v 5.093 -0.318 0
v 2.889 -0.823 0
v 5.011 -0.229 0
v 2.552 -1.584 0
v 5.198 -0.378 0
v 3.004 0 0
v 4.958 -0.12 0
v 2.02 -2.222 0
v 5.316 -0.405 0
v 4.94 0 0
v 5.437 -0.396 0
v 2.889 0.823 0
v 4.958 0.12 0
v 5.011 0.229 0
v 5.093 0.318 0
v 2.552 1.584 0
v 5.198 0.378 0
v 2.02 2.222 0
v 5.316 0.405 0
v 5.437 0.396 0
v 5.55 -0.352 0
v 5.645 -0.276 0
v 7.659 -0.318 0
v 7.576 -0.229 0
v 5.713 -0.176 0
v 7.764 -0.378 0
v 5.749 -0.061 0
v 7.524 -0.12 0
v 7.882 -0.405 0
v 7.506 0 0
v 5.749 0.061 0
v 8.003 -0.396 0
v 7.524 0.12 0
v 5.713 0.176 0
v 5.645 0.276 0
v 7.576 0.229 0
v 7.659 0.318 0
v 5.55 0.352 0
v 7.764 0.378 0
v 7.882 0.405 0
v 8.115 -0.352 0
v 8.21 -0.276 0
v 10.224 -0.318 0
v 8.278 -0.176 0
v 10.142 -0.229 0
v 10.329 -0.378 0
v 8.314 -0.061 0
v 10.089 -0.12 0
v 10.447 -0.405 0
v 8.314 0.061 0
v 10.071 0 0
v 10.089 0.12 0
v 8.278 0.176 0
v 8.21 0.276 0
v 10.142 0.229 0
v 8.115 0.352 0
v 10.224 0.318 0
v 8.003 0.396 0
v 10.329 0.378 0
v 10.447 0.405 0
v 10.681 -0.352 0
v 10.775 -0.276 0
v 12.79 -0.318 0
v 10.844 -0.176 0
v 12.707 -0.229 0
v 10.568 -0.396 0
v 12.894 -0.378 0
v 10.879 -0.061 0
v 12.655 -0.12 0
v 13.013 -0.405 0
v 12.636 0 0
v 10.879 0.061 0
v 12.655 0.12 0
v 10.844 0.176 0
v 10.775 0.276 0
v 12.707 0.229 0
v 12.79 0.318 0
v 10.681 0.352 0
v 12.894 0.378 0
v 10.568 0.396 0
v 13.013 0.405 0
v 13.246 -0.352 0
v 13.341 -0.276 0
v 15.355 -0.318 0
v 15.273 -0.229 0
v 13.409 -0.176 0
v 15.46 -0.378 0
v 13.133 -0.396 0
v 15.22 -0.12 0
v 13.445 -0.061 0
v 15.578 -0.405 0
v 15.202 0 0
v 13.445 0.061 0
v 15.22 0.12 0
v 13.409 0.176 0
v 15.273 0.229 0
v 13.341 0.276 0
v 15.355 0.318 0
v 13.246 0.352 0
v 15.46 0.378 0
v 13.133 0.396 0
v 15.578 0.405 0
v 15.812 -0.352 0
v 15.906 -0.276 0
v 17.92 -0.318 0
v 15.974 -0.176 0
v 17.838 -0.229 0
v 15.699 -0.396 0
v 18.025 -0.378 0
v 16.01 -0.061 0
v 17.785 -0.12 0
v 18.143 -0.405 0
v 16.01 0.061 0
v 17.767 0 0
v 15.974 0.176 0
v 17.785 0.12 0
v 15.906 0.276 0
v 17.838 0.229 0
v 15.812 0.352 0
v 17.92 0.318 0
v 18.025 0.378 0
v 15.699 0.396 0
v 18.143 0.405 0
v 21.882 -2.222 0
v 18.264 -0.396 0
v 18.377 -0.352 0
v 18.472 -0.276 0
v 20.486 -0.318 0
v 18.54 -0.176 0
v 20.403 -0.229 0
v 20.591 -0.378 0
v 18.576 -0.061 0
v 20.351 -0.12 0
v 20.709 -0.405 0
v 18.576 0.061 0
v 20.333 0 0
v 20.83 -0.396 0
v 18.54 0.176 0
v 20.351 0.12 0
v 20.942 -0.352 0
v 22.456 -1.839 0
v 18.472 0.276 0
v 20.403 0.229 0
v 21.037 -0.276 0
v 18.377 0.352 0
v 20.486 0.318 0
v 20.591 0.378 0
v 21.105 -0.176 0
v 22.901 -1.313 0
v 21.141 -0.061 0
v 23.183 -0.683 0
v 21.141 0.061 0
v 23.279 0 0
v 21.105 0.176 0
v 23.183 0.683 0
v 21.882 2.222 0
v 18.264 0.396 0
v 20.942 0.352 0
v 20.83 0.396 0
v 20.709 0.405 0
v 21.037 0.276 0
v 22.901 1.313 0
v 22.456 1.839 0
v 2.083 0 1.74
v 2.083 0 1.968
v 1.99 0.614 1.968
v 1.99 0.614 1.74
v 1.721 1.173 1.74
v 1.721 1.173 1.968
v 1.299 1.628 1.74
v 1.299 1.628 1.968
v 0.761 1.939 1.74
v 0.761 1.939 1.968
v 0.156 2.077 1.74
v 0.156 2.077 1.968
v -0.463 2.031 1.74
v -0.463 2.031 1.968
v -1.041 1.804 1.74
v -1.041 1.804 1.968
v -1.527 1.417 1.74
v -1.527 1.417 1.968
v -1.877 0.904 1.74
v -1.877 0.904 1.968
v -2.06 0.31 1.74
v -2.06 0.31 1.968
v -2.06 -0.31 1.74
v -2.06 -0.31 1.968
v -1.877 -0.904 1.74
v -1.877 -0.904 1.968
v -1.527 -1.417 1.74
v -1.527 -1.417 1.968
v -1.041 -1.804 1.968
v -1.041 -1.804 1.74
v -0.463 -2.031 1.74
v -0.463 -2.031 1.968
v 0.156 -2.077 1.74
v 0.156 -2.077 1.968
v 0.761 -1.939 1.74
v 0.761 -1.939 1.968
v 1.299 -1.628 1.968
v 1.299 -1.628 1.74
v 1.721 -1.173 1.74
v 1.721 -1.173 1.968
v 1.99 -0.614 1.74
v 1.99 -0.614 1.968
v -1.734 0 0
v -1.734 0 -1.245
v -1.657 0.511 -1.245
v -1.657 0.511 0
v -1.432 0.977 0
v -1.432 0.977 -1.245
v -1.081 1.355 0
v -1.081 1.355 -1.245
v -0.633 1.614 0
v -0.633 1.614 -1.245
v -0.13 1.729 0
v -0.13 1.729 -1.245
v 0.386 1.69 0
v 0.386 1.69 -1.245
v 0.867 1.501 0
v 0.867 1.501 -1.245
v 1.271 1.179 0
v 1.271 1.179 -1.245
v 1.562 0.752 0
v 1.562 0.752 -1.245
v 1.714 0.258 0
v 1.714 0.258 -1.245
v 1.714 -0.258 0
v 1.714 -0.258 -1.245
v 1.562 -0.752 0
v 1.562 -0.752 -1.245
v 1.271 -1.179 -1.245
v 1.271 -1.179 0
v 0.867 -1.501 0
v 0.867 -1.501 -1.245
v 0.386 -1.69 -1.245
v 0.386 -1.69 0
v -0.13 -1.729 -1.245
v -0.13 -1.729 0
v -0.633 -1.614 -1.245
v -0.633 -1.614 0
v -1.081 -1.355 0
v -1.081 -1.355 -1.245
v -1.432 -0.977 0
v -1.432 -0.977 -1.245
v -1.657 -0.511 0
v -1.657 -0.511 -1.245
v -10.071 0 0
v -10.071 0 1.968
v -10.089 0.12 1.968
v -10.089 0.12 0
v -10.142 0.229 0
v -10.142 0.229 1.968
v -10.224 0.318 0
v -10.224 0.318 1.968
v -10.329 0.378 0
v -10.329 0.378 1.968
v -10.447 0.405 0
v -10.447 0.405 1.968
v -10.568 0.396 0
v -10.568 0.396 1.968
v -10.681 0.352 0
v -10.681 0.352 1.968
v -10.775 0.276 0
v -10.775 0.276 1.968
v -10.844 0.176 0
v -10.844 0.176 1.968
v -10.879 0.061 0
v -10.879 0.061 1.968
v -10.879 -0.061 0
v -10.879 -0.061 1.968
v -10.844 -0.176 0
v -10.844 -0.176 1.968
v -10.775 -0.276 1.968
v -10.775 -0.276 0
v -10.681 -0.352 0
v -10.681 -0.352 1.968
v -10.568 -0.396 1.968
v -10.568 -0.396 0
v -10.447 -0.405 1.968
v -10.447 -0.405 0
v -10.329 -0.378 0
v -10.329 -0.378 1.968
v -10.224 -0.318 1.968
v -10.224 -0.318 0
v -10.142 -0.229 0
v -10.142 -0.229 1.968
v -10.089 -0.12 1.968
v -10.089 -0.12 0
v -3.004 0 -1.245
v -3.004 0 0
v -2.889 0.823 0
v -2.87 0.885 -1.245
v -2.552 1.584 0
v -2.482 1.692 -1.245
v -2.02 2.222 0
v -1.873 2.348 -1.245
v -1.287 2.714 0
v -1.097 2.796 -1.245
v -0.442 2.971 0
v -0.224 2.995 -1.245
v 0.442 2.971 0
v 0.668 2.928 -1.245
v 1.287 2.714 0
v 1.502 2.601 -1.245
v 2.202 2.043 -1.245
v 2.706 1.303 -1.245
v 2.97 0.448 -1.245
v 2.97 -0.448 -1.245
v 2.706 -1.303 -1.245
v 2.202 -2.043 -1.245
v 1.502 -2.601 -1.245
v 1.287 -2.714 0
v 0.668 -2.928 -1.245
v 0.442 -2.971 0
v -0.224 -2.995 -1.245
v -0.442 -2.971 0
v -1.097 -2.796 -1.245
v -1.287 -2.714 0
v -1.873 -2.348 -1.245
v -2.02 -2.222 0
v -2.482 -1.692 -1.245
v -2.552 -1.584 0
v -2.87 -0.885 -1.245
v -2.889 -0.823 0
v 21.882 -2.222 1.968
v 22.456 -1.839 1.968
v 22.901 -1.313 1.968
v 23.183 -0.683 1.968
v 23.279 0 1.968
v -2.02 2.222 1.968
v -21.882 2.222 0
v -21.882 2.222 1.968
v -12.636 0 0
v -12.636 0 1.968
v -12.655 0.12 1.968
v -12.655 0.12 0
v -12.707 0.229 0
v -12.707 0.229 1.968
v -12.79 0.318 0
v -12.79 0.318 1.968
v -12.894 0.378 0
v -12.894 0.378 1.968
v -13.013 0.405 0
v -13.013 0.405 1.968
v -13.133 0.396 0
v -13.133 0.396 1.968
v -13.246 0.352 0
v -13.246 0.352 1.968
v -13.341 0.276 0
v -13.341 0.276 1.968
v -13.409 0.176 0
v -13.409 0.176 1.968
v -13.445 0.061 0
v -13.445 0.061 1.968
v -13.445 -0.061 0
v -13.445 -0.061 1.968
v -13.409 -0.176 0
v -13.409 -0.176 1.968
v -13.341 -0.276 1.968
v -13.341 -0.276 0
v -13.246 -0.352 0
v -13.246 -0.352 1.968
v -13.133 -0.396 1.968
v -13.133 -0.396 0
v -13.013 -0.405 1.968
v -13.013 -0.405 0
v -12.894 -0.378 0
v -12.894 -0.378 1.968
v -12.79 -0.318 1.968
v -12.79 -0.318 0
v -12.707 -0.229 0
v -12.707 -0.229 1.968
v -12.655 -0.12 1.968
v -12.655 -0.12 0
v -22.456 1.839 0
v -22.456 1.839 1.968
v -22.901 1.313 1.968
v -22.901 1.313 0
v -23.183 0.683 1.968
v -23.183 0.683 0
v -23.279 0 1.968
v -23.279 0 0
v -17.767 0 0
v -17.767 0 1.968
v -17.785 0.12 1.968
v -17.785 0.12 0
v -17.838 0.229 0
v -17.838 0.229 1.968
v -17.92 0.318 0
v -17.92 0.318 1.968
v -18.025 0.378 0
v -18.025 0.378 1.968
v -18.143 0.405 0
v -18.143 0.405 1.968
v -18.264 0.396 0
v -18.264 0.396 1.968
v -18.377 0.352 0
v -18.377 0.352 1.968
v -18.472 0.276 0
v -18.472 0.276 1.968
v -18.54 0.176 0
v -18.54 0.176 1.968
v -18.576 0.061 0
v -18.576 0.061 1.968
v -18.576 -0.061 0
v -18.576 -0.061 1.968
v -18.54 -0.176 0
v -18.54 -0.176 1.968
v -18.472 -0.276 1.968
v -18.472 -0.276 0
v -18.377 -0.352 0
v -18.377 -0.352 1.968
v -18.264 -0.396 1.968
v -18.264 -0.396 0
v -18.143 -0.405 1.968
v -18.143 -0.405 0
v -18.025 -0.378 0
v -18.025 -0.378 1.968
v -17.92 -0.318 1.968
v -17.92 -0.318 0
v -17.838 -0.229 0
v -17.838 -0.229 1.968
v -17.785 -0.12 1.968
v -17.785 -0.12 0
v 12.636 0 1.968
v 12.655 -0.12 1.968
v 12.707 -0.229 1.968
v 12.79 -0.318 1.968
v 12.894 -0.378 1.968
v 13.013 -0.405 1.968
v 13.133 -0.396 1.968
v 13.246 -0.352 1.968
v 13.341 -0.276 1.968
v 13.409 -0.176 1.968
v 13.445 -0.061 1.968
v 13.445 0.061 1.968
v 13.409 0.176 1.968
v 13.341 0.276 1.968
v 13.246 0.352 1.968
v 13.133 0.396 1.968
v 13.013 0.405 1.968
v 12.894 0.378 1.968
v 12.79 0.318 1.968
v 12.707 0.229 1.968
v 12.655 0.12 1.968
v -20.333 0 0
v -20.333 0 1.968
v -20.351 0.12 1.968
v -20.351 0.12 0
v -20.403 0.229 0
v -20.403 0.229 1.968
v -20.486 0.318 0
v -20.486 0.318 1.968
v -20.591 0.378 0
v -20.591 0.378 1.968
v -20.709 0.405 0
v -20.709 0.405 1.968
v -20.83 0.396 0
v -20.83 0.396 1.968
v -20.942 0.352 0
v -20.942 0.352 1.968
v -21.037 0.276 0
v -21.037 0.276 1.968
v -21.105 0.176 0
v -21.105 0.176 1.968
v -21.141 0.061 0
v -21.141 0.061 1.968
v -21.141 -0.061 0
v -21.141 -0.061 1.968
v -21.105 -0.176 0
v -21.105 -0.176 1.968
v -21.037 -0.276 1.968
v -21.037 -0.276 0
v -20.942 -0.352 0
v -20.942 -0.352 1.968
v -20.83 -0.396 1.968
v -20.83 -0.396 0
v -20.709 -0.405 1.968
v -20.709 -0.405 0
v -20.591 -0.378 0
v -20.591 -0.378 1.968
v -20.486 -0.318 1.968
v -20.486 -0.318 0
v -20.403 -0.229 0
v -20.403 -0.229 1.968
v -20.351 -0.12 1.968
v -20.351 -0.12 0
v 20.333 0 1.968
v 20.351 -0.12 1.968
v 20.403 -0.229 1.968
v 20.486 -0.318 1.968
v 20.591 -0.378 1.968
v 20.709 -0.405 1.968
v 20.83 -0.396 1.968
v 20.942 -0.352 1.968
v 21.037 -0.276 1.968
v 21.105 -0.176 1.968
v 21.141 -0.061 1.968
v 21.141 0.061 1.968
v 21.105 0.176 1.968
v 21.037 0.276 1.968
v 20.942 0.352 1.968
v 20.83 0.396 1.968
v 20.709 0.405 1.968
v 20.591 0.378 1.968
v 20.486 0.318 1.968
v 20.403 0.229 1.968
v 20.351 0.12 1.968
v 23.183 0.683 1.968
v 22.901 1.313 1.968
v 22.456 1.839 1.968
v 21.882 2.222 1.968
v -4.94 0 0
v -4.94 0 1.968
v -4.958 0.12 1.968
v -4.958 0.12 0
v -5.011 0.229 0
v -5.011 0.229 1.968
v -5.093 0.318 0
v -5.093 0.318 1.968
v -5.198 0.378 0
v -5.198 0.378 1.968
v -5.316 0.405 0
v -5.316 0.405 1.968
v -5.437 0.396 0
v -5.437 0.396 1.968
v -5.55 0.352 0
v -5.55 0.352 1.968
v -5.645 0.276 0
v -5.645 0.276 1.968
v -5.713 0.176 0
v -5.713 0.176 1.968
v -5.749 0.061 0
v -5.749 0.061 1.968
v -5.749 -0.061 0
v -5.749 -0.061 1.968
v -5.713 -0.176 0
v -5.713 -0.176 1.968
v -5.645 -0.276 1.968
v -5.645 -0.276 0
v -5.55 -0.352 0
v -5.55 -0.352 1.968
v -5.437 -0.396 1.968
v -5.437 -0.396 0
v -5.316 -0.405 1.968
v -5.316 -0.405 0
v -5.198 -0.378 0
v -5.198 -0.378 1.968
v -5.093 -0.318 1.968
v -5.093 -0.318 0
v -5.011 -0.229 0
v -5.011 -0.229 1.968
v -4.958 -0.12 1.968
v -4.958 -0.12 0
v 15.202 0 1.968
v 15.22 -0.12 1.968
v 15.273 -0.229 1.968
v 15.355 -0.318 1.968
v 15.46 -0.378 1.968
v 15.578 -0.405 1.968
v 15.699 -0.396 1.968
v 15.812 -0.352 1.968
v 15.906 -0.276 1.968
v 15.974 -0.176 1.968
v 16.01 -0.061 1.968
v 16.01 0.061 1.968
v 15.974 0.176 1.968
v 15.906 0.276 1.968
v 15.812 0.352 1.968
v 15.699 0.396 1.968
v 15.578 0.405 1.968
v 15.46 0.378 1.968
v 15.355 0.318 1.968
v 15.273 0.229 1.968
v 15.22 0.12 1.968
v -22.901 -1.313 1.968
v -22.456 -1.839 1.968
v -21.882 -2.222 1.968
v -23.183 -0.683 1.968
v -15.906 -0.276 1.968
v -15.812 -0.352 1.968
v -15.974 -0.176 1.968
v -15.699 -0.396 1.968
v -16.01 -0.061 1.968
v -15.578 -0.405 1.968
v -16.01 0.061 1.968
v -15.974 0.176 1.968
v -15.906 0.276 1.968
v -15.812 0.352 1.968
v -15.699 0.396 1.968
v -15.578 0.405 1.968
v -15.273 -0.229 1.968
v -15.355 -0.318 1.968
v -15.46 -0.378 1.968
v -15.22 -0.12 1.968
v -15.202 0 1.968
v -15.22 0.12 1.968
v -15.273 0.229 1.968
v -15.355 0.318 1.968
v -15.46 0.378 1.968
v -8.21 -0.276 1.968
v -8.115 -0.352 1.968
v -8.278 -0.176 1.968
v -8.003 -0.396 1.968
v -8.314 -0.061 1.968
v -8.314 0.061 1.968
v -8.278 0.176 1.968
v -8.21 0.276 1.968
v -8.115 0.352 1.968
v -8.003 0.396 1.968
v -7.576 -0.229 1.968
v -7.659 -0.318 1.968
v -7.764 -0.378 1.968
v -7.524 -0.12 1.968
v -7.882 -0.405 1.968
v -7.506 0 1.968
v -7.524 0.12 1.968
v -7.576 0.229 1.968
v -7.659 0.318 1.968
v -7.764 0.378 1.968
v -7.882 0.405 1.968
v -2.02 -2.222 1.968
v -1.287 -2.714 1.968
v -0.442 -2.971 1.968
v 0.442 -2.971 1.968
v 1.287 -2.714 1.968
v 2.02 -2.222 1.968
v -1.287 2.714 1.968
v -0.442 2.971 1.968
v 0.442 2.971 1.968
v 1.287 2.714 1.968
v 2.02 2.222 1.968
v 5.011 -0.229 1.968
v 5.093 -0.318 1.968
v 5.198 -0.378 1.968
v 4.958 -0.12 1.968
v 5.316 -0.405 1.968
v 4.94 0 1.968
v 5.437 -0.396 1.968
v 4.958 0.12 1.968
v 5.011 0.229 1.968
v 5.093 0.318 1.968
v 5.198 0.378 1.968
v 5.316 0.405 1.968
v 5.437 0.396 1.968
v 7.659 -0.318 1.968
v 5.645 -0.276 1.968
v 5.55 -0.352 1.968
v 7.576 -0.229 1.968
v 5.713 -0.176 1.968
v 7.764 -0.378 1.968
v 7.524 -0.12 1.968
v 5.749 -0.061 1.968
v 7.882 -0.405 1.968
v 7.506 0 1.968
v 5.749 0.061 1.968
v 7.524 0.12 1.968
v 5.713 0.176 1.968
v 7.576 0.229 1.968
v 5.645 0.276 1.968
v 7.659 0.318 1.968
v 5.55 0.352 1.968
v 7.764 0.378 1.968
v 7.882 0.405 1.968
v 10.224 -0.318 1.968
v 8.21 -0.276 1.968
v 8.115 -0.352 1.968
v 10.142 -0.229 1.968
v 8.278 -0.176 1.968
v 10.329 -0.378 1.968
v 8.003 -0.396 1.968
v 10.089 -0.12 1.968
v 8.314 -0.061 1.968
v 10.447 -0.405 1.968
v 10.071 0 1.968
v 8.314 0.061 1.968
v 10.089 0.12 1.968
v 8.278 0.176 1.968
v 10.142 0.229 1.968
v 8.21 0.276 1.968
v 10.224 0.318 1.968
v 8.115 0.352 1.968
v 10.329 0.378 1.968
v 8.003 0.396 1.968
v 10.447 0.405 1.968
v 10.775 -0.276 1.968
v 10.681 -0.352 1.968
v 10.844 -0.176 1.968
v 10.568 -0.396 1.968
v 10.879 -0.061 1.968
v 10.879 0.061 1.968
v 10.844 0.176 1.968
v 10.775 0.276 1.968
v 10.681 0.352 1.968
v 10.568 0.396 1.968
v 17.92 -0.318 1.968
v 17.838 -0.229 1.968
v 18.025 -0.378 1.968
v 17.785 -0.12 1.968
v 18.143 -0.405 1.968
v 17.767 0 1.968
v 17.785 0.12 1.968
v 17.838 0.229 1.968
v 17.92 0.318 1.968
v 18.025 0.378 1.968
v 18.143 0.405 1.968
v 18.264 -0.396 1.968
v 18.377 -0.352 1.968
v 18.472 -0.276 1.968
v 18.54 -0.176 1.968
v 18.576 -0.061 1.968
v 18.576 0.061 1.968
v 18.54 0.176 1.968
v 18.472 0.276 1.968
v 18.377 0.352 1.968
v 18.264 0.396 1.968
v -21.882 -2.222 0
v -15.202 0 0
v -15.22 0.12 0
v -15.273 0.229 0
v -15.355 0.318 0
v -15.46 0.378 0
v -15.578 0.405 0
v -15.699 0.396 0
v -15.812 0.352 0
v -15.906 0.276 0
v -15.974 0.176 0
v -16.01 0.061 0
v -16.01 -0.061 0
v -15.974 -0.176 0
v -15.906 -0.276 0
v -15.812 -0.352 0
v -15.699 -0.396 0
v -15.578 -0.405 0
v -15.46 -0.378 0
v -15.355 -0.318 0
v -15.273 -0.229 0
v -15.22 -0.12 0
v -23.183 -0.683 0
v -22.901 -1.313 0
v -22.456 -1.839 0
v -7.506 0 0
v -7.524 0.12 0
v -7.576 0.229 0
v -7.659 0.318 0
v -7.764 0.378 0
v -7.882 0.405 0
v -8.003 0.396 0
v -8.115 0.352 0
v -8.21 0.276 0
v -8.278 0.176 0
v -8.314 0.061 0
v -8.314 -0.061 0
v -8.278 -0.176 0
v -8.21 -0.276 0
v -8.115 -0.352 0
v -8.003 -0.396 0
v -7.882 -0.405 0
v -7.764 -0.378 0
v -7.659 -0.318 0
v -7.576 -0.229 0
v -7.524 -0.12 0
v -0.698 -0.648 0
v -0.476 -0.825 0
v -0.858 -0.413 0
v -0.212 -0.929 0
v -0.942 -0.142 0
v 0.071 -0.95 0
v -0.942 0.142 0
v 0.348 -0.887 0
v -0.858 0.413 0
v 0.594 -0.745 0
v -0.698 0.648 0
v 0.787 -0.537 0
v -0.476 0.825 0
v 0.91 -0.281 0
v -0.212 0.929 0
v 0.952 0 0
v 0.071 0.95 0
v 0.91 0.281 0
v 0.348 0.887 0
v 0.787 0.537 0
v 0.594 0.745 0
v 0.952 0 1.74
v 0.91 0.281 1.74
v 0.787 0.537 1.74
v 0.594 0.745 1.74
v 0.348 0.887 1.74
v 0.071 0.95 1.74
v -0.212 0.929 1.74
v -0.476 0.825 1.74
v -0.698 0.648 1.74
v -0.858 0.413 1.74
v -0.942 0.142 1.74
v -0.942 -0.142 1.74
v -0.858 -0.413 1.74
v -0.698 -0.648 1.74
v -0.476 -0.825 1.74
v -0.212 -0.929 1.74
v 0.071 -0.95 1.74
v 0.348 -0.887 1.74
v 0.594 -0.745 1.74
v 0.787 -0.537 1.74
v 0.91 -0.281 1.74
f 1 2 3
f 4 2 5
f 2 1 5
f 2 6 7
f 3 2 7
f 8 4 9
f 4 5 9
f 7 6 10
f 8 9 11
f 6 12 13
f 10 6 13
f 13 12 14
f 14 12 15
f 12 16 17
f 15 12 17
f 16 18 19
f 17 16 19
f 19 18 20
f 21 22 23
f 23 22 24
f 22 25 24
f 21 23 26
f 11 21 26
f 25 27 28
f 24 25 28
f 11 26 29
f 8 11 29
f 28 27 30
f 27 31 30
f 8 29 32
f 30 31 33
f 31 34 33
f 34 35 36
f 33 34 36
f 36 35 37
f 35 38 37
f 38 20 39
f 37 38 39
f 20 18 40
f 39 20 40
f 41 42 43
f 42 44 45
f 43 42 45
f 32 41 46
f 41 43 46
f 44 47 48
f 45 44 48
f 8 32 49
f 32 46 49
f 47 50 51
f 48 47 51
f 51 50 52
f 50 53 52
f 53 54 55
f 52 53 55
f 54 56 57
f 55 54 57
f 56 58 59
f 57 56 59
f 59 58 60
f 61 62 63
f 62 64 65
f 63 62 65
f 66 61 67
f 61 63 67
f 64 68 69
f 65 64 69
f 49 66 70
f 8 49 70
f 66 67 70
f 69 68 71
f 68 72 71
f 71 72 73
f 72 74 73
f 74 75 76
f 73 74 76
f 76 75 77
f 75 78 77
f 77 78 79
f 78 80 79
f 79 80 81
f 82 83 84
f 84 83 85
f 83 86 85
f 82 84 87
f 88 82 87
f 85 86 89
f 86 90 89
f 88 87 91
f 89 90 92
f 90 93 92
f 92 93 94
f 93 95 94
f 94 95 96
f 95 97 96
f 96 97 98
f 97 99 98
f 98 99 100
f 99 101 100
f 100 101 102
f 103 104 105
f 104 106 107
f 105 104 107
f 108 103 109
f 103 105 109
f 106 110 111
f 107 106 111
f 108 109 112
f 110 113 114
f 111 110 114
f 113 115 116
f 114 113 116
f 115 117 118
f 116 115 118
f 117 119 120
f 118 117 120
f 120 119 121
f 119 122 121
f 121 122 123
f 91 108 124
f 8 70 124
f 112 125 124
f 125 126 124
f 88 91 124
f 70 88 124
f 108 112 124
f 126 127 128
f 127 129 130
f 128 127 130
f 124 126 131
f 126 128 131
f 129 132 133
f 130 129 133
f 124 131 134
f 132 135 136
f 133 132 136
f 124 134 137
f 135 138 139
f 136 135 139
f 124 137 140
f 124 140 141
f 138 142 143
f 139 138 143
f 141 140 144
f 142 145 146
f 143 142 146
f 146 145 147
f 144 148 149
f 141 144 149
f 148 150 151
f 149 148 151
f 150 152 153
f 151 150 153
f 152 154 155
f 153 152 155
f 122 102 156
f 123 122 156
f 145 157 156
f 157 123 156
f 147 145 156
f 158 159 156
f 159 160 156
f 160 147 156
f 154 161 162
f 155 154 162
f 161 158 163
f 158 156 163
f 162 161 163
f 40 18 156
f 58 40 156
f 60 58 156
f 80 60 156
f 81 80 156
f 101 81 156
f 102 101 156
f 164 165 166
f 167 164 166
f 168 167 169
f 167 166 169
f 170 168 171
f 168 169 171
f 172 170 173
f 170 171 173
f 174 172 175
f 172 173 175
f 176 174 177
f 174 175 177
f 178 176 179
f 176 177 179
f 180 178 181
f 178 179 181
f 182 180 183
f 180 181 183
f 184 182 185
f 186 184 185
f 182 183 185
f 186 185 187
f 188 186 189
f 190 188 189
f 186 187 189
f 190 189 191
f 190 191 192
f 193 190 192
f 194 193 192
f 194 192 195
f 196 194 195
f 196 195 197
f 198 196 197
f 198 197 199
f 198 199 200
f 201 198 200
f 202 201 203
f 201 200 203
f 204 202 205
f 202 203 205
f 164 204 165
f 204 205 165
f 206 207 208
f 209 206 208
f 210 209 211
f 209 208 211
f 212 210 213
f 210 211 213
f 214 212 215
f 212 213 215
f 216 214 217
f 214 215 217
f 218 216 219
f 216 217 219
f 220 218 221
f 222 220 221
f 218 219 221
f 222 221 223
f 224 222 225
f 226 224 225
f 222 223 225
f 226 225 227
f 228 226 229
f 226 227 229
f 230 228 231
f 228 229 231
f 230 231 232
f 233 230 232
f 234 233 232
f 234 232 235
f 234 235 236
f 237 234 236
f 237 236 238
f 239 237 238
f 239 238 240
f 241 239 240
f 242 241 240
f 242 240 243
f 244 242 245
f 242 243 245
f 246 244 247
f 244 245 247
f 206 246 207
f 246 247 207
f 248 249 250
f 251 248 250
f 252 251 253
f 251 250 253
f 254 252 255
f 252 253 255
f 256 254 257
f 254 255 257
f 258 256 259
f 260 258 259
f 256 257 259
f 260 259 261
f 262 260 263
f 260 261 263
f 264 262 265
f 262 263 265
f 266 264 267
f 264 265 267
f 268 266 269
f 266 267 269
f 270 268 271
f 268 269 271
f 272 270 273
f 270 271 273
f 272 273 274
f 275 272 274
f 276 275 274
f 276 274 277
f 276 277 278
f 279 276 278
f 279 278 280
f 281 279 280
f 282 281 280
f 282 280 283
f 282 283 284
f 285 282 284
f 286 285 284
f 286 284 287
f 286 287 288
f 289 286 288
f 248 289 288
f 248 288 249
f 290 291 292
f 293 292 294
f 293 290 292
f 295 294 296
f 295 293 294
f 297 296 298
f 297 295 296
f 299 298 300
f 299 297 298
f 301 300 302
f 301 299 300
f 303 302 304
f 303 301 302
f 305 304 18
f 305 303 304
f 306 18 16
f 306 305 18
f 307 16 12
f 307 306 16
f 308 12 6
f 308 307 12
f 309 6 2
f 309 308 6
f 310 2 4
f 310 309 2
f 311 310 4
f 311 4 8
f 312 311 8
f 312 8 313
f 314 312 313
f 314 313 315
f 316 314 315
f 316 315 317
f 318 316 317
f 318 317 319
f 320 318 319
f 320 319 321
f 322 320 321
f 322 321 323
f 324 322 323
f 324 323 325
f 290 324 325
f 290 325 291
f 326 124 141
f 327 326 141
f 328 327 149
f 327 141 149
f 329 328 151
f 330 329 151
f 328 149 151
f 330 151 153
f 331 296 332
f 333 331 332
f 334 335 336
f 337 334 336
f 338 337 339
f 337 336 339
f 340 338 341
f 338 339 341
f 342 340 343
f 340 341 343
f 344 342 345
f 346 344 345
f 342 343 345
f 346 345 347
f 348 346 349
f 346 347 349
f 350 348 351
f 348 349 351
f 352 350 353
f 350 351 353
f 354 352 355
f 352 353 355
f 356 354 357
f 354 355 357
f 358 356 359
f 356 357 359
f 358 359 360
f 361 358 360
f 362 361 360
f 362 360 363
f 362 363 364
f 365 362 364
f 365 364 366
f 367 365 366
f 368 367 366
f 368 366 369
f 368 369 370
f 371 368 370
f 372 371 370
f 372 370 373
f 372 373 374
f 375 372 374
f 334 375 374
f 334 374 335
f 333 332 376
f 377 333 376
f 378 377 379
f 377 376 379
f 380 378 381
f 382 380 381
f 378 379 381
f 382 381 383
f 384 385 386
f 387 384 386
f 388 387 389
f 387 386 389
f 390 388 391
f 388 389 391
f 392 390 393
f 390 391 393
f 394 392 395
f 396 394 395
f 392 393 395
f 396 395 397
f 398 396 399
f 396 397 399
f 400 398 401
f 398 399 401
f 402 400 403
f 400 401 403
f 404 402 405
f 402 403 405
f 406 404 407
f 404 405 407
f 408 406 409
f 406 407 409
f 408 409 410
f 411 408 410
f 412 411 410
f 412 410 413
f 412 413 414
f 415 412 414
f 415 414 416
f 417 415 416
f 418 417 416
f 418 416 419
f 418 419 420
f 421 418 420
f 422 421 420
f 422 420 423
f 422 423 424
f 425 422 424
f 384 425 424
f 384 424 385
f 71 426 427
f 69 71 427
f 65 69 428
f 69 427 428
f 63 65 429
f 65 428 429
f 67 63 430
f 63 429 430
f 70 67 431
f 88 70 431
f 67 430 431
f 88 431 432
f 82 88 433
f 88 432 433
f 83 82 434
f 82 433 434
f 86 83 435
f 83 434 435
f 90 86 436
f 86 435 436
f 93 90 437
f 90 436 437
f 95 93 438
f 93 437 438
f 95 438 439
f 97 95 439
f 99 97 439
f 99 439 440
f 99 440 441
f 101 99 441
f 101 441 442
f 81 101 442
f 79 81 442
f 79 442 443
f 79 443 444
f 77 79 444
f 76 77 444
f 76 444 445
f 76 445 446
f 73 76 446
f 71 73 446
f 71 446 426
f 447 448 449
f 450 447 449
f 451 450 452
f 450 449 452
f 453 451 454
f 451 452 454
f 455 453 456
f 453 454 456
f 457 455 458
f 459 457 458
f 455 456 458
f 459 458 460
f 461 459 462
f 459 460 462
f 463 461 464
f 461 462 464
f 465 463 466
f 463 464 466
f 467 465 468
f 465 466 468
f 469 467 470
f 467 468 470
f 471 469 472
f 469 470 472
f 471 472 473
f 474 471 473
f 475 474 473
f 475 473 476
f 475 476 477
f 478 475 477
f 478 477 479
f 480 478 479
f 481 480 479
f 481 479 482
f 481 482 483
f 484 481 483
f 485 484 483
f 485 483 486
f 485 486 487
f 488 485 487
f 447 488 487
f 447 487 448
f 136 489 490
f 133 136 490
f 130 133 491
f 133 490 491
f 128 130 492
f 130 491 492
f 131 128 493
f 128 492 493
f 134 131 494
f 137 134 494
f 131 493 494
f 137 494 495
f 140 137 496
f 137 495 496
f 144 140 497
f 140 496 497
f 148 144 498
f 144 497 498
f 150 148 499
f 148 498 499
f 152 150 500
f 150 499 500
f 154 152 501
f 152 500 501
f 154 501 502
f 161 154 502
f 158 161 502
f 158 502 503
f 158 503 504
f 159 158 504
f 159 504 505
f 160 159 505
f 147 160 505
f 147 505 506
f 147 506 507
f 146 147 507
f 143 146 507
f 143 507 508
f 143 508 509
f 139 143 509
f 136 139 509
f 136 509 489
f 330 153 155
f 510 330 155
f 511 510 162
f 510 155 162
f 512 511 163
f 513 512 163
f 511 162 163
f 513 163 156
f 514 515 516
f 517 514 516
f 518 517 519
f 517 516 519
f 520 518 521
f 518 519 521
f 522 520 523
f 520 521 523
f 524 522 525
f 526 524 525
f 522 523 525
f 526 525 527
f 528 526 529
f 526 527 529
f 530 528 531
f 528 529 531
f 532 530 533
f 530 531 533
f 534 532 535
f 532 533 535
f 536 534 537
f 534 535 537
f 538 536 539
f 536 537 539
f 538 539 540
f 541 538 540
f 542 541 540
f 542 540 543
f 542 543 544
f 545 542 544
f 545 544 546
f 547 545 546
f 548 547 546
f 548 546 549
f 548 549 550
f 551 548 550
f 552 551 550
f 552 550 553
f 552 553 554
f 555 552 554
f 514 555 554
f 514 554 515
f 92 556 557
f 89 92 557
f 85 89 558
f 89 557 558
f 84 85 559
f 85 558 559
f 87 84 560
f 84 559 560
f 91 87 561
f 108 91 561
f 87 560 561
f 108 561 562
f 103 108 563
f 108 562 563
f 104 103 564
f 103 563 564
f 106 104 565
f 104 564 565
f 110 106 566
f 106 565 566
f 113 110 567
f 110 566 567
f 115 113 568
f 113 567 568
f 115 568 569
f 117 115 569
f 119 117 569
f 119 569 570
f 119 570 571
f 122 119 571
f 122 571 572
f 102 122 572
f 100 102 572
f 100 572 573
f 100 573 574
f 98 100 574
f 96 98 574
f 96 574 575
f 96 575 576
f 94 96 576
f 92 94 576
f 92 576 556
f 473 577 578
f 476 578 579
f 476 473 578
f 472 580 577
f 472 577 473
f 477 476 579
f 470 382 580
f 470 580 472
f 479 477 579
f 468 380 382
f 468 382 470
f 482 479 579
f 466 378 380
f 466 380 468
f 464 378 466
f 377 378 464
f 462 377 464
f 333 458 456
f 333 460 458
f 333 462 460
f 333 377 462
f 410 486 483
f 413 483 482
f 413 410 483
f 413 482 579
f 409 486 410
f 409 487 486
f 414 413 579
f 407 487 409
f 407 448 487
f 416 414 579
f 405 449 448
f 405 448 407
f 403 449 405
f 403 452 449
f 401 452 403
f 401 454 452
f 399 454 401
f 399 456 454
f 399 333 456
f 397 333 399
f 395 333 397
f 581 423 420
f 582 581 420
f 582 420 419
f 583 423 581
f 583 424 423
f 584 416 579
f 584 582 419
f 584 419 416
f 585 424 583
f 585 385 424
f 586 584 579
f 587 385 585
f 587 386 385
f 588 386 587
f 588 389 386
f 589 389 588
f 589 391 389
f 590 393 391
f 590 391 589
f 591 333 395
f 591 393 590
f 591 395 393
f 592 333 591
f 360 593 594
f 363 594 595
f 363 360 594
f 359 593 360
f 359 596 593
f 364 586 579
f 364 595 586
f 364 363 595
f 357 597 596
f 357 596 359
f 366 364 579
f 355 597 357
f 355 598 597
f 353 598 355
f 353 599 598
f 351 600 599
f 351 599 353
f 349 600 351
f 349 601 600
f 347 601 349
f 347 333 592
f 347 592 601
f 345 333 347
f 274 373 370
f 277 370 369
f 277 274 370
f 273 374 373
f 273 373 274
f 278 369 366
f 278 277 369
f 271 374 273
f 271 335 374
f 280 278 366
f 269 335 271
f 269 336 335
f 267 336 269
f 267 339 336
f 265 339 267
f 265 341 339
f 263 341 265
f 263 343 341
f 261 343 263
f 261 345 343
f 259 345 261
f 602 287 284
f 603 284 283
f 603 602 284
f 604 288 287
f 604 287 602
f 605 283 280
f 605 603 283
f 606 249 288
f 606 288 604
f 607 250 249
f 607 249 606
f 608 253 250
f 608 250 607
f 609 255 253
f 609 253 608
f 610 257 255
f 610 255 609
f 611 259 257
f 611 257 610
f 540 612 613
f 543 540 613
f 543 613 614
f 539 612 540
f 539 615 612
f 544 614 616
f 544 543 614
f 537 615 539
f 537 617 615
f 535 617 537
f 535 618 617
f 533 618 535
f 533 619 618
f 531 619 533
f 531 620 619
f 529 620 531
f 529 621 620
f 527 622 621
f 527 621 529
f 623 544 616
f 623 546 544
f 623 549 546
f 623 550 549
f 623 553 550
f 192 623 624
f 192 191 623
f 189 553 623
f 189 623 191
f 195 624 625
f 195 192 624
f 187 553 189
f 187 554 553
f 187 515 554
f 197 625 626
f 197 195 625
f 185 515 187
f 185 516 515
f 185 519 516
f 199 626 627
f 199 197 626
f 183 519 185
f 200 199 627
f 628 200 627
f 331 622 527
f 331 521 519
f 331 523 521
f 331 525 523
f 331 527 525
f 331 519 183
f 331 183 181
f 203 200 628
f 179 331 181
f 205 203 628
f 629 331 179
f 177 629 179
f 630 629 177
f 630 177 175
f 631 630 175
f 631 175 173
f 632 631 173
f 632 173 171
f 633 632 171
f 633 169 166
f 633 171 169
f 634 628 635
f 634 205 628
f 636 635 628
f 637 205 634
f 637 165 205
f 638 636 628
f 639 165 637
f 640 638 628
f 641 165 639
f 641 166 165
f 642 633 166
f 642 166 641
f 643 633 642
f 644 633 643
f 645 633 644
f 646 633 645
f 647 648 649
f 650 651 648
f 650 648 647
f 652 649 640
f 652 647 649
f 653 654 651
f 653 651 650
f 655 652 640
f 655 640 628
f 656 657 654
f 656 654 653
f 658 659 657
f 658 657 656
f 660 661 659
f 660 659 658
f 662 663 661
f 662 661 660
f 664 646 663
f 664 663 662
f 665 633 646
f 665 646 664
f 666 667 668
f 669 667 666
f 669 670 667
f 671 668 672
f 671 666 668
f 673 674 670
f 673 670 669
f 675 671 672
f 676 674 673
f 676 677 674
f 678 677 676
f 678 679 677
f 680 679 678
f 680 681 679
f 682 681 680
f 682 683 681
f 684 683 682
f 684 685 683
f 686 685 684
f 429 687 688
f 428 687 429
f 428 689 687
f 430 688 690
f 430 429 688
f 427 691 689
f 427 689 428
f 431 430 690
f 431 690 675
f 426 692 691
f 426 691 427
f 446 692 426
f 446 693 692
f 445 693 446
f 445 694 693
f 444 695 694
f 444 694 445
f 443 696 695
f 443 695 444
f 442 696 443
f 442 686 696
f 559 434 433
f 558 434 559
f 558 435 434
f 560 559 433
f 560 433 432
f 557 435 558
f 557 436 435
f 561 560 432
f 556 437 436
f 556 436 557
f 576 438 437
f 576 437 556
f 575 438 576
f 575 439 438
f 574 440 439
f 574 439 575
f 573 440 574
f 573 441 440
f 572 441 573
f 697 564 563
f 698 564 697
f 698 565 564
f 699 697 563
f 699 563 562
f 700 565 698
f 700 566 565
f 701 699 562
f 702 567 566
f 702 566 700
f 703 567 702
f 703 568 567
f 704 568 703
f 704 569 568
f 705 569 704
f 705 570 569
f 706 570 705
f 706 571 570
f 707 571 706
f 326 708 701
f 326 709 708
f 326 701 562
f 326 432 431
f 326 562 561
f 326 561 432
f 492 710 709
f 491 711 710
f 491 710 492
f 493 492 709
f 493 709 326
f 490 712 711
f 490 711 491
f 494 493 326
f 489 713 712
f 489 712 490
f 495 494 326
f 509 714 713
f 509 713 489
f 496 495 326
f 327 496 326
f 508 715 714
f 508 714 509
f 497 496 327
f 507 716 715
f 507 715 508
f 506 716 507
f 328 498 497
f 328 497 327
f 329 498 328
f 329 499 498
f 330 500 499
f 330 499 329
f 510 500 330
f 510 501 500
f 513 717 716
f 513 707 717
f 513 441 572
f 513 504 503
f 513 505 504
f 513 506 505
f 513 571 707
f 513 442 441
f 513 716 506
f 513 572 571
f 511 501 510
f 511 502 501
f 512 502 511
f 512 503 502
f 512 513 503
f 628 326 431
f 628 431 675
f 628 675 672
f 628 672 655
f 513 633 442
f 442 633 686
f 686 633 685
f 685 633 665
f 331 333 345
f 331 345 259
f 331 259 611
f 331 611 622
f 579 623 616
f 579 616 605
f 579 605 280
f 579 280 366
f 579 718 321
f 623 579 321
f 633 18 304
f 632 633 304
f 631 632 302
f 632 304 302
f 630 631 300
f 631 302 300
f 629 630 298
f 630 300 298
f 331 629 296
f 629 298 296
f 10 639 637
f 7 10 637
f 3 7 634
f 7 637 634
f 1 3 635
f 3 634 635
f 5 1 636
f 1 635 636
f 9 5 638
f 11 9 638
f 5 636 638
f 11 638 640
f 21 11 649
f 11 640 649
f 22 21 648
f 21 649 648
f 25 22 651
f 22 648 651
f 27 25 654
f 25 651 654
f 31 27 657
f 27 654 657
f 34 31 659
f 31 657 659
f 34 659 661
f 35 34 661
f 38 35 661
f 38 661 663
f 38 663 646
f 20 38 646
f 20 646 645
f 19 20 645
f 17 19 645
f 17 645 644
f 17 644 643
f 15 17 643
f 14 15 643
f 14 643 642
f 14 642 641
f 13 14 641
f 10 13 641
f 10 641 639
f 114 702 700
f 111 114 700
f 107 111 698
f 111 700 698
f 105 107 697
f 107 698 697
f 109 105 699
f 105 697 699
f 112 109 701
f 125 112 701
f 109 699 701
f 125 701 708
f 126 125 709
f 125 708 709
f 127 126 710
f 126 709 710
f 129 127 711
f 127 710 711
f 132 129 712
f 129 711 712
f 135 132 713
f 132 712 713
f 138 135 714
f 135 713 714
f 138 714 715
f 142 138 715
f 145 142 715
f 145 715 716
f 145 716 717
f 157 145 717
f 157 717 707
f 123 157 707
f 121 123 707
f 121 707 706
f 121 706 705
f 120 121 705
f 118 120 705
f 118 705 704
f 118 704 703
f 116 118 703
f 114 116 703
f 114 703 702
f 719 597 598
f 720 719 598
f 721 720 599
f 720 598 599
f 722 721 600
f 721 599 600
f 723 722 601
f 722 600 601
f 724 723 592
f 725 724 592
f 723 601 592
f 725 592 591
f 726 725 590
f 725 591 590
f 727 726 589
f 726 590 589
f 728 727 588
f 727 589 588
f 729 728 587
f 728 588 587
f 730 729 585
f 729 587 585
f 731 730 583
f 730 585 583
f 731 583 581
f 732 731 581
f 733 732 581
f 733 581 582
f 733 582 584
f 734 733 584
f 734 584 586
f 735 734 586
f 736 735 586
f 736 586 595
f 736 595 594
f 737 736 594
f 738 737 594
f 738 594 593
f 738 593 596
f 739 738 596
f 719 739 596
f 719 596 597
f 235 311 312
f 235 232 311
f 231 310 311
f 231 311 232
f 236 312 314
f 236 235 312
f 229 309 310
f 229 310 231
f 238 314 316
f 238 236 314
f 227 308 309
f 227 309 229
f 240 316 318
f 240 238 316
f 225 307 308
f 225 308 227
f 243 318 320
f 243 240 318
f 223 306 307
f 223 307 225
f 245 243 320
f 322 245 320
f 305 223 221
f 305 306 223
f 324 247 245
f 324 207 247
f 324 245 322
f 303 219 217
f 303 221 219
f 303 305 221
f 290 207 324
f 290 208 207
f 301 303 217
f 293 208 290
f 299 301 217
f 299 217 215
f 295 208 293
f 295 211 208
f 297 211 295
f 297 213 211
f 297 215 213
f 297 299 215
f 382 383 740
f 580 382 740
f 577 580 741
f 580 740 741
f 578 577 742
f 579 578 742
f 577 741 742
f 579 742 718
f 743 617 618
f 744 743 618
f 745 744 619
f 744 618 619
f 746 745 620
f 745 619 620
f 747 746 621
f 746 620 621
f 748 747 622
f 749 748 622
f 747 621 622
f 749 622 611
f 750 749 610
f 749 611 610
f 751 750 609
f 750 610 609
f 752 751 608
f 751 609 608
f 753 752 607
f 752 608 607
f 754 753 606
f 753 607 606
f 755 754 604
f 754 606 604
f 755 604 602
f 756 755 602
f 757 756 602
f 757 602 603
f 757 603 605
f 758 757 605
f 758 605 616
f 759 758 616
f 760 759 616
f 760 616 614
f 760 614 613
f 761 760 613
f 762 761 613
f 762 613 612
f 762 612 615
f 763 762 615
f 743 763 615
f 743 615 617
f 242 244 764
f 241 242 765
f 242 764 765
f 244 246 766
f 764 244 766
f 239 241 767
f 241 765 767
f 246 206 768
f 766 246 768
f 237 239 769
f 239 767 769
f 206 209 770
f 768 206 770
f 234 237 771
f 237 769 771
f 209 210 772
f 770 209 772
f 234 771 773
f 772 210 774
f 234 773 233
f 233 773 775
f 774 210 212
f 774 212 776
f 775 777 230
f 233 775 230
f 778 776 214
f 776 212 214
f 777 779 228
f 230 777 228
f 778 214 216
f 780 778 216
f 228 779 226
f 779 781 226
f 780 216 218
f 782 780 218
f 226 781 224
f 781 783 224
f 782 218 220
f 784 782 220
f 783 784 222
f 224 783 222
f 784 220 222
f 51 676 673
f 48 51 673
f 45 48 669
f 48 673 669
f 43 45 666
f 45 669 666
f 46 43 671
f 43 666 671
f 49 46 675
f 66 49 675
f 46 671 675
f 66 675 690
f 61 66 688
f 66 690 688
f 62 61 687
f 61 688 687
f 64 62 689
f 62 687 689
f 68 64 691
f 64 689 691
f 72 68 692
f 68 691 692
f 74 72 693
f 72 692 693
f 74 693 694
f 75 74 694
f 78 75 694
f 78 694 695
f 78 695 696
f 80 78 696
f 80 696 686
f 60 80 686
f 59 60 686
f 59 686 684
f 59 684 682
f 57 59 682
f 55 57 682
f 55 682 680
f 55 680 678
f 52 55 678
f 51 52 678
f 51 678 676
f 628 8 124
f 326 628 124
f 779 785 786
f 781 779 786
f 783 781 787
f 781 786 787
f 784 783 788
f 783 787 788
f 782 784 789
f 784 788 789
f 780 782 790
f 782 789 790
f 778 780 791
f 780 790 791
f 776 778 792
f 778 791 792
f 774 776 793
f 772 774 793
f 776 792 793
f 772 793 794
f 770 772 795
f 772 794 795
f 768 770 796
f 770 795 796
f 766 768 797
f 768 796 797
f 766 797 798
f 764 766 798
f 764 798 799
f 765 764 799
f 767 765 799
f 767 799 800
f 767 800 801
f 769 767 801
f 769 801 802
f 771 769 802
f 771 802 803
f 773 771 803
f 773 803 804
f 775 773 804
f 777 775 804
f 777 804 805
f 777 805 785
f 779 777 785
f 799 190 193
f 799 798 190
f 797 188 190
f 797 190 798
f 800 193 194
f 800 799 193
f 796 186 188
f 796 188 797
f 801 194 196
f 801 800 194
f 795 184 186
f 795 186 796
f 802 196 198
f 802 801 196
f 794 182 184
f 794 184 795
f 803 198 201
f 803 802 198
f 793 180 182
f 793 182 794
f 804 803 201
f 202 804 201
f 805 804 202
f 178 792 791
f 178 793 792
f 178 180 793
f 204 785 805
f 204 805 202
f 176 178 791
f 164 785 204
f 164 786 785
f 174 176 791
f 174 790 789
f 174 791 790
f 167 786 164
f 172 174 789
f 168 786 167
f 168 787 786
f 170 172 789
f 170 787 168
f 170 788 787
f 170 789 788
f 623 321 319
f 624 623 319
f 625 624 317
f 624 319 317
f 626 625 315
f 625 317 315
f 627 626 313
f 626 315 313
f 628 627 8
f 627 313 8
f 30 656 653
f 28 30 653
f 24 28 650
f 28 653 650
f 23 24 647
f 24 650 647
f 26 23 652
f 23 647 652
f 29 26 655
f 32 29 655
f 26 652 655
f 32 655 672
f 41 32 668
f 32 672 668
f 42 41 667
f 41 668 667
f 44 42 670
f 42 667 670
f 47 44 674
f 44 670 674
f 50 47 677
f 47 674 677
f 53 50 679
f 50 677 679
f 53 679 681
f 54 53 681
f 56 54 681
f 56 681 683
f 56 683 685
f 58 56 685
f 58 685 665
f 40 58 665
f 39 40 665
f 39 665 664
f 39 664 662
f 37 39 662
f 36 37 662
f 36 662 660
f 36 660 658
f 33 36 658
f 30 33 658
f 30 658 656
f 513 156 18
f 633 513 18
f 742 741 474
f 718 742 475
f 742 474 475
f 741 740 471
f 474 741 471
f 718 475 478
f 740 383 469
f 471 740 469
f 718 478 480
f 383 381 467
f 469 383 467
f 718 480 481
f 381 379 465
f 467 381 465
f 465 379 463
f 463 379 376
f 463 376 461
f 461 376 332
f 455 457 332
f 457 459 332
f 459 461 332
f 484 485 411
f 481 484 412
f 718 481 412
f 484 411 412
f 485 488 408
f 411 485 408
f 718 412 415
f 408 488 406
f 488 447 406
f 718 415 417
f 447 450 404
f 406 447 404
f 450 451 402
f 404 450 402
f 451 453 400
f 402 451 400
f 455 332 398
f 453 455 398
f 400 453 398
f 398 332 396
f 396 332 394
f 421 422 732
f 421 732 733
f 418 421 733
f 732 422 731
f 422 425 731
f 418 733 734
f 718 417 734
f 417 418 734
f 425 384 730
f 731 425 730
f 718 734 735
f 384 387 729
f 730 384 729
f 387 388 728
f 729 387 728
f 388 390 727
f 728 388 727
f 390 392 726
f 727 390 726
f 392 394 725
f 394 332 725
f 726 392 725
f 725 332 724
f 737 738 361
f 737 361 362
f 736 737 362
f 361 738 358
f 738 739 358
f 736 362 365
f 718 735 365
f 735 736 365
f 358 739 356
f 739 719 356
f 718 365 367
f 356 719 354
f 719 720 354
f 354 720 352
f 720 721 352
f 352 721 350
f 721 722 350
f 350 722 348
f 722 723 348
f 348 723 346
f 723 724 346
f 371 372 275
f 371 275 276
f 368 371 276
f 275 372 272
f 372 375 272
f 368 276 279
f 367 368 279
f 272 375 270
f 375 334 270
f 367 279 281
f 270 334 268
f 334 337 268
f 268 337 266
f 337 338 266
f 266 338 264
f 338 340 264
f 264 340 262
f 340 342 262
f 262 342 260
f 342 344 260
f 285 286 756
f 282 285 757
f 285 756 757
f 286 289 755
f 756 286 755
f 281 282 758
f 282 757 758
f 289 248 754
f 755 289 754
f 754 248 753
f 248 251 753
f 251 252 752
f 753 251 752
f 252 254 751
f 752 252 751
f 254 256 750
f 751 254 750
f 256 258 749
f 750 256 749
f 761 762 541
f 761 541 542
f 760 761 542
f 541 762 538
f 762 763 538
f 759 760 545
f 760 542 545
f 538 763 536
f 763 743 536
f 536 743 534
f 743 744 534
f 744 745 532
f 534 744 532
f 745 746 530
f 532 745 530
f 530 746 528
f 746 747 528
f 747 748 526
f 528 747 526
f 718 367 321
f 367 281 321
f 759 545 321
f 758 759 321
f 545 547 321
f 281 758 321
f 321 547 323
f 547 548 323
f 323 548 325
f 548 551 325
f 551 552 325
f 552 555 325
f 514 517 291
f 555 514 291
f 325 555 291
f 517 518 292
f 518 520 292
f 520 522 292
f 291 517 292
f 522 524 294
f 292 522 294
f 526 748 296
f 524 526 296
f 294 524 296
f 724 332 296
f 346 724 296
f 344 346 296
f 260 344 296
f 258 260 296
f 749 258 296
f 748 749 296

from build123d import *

# Parameters (mm, degrees)
BOSS_EXTRUDE1_DEPTH = 1.9685
SKETCH2_R           = 0.4064
CUT_EXTRUDE1_DEPTH  = 24.55446458
SKETCH3_R           = 2.0828
CUT_EXTRUDE2_DEPTH  = 0.2286
SKETCH4_R           = 0.9525
CUT_EXTRUDE3_DEPTH  = 24.536462381
BOSS_EXTRUDE2_START = 1.2446
SKETCH5_R           = 3.00355
SKETCH5_R_2         = 1.73355
BOSS_EXTRUDE2_DEPTH = 1.2446


with BuildPart() as part:
    # Sketch1 → Boss-Extrude1 (new body)
    with BuildSketch(Plane.XY):
        with BuildLine():
            Line((2.020348077, -2.2225), (-2.020348077, -2.2225))
            ThreePointArc((-2.020348077, -2.2225), (0, -3.00355), (2.020348077, -2.2225))
        make_face()
        with BuildLine():
            Line((2.020348077, 2.2225), (-2.020348077, 2.2225))
            ThreePointArc((-2.020348077, 2.2225), (-3.00355, 0), (-2.020348077, -2.2225))
            Line((-2.020348077, -2.2225), (2.020348077, -2.2225))
            ThreePointArc((2.020348077, -2.2225), (2.746773477, -1.215132942), (3.00355, 0))
            ThreePointArc((3.00355, 0), (2.746773477, 1.215132942), (2.020348077, 2.2225))
        make_face()
        with BuildLine():
            ThreePointArc((2.020348077, 2.2225), (0, 3.00355), (-2.020348077, 2.2225))
            Line((-2.020348077, 2.2225), (2.020348077, 2.2225))
        make_face()
        with BuildLine():
            Line((21.8821, 2.2225), (2.020348077, 2.2225))
            ThreePointArc((2.020348077, 2.2225), (2.746773477, 1.215132942), (3.00355, 0))
            ThreePointArc((3.00355, 0), (2.746773477, -1.215132942), (2.020348077, -2.2225))
            Line((2.020348077, -2.2225), (21.8821, -2.2225))
            ThreePointArc((21.8821, -2.2225), (22.900844734, -1.31254669), (23.2791, 0))
            ThreePointArc((23.2791, 0), (22.900844734, 1.31254669), (21.8821, 2.2225))
        make_face()
        with BuildLine():
            Line((-2.020348077, 2.2225), (-21.8821, 2.2225))
            ThreePointArc((-21.8821, 2.2225), (-22.900844734, 1.31254669), (-23.2791, 0))
            ThreePointArc((-23.2791, 0), (-22.900844734, -1.31254669), (-21.8821, -2.2225))
            Line((-21.8821, -2.2225), (-2.020348077, -2.2225))
            ThreePointArc((-2.020348077, -2.2225), (-3.00355, 0), (-2.020348077, 2.2225))
        make_face()
    extrude(amount=BOSS_EXTRUDE1_DEPTH)

    # Sketch2 → Cut-Extrude1 (cut, through all)
    with BuildSketch(Plane.XY.offset(1.9685)):
        with Locations((-20.7391, 0)):
            Circle(SKETCH2_R)
        with Locations((-18.1737, 0)):
            Circle(SKETCH2_R)
        with Locations((-15.6083, 0)):
            Circle(SKETCH2_R)
        with Locations((-13.0429, 0)):
            Circle(SKETCH2_R)
        with Locations((-10.4775, 0)):
            Circle(SKETCH2_R)
        with Locations((-7.9121, 0)):
            Circle(SKETCH2_R)
        with Locations((-5.3467, 0)):
            Circle(SKETCH2_R)
        with Locations(Location((5.3467, 0, 0), (0, 0, 180))):
            Circle(SKETCH2_R)
        with Locations(Location((7.9121, 0, 0), (0, 0, 180))):
            Circle(SKETCH2_R)
        with Locations(Location((10.4775, 0, 0), (0, 0, 180))):
            Circle(SKETCH2_R)
        with Locations(Location((13.0429, 0, 0), (0, 0, 180))):
            Circle(SKETCH2_R)
        with Locations(Location((15.6083, 0, 0), (0, 0, 180))):
            Circle(SKETCH2_R)
        with Locations(Location((18.1737, 0, 0), (0, 0, 180))):
            Circle(SKETCH2_R)
        with Locations(Location((20.7391, 0, 0), (0, 0, 180))):
            Circle(SKETCH2_R)
    extrude(amount=-CUT_EXTRUDE1_DEPTH, mode=Mode.SUBTRACT)

    # Sketch3 → Cut-Extrude2 (cut)
    with BuildSketch(Plane.XY.offset(1.9685)):
        Circle(SKETCH3_R)
    extrude(amount=-CUT_EXTRUDE2_DEPTH, mode=Mode.SUBTRACT)

    # Sketch4 → Cut-Extrude3 (cut, through all)
    with BuildSketch(Plane.XY.offset(1.7399)):
        Circle(SKETCH4_R)
    extrude(amount=-CUT_EXTRUDE3_DEPTH, mode=Mode.SUBTRACT)

    # Sketch5 → Boss-Extrude2 (add)
    with BuildSketch(Plane(origin=(0, 0, 0), x_dir=(-1, 0, 0), z_dir=(0, 0, -1)).offset(BOSS_EXTRUDE2_START)):
        Circle(SKETCH5_R)
        Circle(SKETCH5_R_2, mode=Mode.SUBTRACT)
    extrude(amount=-BOSS_EXTRUDE2_DEPTH)


solid = part.part
